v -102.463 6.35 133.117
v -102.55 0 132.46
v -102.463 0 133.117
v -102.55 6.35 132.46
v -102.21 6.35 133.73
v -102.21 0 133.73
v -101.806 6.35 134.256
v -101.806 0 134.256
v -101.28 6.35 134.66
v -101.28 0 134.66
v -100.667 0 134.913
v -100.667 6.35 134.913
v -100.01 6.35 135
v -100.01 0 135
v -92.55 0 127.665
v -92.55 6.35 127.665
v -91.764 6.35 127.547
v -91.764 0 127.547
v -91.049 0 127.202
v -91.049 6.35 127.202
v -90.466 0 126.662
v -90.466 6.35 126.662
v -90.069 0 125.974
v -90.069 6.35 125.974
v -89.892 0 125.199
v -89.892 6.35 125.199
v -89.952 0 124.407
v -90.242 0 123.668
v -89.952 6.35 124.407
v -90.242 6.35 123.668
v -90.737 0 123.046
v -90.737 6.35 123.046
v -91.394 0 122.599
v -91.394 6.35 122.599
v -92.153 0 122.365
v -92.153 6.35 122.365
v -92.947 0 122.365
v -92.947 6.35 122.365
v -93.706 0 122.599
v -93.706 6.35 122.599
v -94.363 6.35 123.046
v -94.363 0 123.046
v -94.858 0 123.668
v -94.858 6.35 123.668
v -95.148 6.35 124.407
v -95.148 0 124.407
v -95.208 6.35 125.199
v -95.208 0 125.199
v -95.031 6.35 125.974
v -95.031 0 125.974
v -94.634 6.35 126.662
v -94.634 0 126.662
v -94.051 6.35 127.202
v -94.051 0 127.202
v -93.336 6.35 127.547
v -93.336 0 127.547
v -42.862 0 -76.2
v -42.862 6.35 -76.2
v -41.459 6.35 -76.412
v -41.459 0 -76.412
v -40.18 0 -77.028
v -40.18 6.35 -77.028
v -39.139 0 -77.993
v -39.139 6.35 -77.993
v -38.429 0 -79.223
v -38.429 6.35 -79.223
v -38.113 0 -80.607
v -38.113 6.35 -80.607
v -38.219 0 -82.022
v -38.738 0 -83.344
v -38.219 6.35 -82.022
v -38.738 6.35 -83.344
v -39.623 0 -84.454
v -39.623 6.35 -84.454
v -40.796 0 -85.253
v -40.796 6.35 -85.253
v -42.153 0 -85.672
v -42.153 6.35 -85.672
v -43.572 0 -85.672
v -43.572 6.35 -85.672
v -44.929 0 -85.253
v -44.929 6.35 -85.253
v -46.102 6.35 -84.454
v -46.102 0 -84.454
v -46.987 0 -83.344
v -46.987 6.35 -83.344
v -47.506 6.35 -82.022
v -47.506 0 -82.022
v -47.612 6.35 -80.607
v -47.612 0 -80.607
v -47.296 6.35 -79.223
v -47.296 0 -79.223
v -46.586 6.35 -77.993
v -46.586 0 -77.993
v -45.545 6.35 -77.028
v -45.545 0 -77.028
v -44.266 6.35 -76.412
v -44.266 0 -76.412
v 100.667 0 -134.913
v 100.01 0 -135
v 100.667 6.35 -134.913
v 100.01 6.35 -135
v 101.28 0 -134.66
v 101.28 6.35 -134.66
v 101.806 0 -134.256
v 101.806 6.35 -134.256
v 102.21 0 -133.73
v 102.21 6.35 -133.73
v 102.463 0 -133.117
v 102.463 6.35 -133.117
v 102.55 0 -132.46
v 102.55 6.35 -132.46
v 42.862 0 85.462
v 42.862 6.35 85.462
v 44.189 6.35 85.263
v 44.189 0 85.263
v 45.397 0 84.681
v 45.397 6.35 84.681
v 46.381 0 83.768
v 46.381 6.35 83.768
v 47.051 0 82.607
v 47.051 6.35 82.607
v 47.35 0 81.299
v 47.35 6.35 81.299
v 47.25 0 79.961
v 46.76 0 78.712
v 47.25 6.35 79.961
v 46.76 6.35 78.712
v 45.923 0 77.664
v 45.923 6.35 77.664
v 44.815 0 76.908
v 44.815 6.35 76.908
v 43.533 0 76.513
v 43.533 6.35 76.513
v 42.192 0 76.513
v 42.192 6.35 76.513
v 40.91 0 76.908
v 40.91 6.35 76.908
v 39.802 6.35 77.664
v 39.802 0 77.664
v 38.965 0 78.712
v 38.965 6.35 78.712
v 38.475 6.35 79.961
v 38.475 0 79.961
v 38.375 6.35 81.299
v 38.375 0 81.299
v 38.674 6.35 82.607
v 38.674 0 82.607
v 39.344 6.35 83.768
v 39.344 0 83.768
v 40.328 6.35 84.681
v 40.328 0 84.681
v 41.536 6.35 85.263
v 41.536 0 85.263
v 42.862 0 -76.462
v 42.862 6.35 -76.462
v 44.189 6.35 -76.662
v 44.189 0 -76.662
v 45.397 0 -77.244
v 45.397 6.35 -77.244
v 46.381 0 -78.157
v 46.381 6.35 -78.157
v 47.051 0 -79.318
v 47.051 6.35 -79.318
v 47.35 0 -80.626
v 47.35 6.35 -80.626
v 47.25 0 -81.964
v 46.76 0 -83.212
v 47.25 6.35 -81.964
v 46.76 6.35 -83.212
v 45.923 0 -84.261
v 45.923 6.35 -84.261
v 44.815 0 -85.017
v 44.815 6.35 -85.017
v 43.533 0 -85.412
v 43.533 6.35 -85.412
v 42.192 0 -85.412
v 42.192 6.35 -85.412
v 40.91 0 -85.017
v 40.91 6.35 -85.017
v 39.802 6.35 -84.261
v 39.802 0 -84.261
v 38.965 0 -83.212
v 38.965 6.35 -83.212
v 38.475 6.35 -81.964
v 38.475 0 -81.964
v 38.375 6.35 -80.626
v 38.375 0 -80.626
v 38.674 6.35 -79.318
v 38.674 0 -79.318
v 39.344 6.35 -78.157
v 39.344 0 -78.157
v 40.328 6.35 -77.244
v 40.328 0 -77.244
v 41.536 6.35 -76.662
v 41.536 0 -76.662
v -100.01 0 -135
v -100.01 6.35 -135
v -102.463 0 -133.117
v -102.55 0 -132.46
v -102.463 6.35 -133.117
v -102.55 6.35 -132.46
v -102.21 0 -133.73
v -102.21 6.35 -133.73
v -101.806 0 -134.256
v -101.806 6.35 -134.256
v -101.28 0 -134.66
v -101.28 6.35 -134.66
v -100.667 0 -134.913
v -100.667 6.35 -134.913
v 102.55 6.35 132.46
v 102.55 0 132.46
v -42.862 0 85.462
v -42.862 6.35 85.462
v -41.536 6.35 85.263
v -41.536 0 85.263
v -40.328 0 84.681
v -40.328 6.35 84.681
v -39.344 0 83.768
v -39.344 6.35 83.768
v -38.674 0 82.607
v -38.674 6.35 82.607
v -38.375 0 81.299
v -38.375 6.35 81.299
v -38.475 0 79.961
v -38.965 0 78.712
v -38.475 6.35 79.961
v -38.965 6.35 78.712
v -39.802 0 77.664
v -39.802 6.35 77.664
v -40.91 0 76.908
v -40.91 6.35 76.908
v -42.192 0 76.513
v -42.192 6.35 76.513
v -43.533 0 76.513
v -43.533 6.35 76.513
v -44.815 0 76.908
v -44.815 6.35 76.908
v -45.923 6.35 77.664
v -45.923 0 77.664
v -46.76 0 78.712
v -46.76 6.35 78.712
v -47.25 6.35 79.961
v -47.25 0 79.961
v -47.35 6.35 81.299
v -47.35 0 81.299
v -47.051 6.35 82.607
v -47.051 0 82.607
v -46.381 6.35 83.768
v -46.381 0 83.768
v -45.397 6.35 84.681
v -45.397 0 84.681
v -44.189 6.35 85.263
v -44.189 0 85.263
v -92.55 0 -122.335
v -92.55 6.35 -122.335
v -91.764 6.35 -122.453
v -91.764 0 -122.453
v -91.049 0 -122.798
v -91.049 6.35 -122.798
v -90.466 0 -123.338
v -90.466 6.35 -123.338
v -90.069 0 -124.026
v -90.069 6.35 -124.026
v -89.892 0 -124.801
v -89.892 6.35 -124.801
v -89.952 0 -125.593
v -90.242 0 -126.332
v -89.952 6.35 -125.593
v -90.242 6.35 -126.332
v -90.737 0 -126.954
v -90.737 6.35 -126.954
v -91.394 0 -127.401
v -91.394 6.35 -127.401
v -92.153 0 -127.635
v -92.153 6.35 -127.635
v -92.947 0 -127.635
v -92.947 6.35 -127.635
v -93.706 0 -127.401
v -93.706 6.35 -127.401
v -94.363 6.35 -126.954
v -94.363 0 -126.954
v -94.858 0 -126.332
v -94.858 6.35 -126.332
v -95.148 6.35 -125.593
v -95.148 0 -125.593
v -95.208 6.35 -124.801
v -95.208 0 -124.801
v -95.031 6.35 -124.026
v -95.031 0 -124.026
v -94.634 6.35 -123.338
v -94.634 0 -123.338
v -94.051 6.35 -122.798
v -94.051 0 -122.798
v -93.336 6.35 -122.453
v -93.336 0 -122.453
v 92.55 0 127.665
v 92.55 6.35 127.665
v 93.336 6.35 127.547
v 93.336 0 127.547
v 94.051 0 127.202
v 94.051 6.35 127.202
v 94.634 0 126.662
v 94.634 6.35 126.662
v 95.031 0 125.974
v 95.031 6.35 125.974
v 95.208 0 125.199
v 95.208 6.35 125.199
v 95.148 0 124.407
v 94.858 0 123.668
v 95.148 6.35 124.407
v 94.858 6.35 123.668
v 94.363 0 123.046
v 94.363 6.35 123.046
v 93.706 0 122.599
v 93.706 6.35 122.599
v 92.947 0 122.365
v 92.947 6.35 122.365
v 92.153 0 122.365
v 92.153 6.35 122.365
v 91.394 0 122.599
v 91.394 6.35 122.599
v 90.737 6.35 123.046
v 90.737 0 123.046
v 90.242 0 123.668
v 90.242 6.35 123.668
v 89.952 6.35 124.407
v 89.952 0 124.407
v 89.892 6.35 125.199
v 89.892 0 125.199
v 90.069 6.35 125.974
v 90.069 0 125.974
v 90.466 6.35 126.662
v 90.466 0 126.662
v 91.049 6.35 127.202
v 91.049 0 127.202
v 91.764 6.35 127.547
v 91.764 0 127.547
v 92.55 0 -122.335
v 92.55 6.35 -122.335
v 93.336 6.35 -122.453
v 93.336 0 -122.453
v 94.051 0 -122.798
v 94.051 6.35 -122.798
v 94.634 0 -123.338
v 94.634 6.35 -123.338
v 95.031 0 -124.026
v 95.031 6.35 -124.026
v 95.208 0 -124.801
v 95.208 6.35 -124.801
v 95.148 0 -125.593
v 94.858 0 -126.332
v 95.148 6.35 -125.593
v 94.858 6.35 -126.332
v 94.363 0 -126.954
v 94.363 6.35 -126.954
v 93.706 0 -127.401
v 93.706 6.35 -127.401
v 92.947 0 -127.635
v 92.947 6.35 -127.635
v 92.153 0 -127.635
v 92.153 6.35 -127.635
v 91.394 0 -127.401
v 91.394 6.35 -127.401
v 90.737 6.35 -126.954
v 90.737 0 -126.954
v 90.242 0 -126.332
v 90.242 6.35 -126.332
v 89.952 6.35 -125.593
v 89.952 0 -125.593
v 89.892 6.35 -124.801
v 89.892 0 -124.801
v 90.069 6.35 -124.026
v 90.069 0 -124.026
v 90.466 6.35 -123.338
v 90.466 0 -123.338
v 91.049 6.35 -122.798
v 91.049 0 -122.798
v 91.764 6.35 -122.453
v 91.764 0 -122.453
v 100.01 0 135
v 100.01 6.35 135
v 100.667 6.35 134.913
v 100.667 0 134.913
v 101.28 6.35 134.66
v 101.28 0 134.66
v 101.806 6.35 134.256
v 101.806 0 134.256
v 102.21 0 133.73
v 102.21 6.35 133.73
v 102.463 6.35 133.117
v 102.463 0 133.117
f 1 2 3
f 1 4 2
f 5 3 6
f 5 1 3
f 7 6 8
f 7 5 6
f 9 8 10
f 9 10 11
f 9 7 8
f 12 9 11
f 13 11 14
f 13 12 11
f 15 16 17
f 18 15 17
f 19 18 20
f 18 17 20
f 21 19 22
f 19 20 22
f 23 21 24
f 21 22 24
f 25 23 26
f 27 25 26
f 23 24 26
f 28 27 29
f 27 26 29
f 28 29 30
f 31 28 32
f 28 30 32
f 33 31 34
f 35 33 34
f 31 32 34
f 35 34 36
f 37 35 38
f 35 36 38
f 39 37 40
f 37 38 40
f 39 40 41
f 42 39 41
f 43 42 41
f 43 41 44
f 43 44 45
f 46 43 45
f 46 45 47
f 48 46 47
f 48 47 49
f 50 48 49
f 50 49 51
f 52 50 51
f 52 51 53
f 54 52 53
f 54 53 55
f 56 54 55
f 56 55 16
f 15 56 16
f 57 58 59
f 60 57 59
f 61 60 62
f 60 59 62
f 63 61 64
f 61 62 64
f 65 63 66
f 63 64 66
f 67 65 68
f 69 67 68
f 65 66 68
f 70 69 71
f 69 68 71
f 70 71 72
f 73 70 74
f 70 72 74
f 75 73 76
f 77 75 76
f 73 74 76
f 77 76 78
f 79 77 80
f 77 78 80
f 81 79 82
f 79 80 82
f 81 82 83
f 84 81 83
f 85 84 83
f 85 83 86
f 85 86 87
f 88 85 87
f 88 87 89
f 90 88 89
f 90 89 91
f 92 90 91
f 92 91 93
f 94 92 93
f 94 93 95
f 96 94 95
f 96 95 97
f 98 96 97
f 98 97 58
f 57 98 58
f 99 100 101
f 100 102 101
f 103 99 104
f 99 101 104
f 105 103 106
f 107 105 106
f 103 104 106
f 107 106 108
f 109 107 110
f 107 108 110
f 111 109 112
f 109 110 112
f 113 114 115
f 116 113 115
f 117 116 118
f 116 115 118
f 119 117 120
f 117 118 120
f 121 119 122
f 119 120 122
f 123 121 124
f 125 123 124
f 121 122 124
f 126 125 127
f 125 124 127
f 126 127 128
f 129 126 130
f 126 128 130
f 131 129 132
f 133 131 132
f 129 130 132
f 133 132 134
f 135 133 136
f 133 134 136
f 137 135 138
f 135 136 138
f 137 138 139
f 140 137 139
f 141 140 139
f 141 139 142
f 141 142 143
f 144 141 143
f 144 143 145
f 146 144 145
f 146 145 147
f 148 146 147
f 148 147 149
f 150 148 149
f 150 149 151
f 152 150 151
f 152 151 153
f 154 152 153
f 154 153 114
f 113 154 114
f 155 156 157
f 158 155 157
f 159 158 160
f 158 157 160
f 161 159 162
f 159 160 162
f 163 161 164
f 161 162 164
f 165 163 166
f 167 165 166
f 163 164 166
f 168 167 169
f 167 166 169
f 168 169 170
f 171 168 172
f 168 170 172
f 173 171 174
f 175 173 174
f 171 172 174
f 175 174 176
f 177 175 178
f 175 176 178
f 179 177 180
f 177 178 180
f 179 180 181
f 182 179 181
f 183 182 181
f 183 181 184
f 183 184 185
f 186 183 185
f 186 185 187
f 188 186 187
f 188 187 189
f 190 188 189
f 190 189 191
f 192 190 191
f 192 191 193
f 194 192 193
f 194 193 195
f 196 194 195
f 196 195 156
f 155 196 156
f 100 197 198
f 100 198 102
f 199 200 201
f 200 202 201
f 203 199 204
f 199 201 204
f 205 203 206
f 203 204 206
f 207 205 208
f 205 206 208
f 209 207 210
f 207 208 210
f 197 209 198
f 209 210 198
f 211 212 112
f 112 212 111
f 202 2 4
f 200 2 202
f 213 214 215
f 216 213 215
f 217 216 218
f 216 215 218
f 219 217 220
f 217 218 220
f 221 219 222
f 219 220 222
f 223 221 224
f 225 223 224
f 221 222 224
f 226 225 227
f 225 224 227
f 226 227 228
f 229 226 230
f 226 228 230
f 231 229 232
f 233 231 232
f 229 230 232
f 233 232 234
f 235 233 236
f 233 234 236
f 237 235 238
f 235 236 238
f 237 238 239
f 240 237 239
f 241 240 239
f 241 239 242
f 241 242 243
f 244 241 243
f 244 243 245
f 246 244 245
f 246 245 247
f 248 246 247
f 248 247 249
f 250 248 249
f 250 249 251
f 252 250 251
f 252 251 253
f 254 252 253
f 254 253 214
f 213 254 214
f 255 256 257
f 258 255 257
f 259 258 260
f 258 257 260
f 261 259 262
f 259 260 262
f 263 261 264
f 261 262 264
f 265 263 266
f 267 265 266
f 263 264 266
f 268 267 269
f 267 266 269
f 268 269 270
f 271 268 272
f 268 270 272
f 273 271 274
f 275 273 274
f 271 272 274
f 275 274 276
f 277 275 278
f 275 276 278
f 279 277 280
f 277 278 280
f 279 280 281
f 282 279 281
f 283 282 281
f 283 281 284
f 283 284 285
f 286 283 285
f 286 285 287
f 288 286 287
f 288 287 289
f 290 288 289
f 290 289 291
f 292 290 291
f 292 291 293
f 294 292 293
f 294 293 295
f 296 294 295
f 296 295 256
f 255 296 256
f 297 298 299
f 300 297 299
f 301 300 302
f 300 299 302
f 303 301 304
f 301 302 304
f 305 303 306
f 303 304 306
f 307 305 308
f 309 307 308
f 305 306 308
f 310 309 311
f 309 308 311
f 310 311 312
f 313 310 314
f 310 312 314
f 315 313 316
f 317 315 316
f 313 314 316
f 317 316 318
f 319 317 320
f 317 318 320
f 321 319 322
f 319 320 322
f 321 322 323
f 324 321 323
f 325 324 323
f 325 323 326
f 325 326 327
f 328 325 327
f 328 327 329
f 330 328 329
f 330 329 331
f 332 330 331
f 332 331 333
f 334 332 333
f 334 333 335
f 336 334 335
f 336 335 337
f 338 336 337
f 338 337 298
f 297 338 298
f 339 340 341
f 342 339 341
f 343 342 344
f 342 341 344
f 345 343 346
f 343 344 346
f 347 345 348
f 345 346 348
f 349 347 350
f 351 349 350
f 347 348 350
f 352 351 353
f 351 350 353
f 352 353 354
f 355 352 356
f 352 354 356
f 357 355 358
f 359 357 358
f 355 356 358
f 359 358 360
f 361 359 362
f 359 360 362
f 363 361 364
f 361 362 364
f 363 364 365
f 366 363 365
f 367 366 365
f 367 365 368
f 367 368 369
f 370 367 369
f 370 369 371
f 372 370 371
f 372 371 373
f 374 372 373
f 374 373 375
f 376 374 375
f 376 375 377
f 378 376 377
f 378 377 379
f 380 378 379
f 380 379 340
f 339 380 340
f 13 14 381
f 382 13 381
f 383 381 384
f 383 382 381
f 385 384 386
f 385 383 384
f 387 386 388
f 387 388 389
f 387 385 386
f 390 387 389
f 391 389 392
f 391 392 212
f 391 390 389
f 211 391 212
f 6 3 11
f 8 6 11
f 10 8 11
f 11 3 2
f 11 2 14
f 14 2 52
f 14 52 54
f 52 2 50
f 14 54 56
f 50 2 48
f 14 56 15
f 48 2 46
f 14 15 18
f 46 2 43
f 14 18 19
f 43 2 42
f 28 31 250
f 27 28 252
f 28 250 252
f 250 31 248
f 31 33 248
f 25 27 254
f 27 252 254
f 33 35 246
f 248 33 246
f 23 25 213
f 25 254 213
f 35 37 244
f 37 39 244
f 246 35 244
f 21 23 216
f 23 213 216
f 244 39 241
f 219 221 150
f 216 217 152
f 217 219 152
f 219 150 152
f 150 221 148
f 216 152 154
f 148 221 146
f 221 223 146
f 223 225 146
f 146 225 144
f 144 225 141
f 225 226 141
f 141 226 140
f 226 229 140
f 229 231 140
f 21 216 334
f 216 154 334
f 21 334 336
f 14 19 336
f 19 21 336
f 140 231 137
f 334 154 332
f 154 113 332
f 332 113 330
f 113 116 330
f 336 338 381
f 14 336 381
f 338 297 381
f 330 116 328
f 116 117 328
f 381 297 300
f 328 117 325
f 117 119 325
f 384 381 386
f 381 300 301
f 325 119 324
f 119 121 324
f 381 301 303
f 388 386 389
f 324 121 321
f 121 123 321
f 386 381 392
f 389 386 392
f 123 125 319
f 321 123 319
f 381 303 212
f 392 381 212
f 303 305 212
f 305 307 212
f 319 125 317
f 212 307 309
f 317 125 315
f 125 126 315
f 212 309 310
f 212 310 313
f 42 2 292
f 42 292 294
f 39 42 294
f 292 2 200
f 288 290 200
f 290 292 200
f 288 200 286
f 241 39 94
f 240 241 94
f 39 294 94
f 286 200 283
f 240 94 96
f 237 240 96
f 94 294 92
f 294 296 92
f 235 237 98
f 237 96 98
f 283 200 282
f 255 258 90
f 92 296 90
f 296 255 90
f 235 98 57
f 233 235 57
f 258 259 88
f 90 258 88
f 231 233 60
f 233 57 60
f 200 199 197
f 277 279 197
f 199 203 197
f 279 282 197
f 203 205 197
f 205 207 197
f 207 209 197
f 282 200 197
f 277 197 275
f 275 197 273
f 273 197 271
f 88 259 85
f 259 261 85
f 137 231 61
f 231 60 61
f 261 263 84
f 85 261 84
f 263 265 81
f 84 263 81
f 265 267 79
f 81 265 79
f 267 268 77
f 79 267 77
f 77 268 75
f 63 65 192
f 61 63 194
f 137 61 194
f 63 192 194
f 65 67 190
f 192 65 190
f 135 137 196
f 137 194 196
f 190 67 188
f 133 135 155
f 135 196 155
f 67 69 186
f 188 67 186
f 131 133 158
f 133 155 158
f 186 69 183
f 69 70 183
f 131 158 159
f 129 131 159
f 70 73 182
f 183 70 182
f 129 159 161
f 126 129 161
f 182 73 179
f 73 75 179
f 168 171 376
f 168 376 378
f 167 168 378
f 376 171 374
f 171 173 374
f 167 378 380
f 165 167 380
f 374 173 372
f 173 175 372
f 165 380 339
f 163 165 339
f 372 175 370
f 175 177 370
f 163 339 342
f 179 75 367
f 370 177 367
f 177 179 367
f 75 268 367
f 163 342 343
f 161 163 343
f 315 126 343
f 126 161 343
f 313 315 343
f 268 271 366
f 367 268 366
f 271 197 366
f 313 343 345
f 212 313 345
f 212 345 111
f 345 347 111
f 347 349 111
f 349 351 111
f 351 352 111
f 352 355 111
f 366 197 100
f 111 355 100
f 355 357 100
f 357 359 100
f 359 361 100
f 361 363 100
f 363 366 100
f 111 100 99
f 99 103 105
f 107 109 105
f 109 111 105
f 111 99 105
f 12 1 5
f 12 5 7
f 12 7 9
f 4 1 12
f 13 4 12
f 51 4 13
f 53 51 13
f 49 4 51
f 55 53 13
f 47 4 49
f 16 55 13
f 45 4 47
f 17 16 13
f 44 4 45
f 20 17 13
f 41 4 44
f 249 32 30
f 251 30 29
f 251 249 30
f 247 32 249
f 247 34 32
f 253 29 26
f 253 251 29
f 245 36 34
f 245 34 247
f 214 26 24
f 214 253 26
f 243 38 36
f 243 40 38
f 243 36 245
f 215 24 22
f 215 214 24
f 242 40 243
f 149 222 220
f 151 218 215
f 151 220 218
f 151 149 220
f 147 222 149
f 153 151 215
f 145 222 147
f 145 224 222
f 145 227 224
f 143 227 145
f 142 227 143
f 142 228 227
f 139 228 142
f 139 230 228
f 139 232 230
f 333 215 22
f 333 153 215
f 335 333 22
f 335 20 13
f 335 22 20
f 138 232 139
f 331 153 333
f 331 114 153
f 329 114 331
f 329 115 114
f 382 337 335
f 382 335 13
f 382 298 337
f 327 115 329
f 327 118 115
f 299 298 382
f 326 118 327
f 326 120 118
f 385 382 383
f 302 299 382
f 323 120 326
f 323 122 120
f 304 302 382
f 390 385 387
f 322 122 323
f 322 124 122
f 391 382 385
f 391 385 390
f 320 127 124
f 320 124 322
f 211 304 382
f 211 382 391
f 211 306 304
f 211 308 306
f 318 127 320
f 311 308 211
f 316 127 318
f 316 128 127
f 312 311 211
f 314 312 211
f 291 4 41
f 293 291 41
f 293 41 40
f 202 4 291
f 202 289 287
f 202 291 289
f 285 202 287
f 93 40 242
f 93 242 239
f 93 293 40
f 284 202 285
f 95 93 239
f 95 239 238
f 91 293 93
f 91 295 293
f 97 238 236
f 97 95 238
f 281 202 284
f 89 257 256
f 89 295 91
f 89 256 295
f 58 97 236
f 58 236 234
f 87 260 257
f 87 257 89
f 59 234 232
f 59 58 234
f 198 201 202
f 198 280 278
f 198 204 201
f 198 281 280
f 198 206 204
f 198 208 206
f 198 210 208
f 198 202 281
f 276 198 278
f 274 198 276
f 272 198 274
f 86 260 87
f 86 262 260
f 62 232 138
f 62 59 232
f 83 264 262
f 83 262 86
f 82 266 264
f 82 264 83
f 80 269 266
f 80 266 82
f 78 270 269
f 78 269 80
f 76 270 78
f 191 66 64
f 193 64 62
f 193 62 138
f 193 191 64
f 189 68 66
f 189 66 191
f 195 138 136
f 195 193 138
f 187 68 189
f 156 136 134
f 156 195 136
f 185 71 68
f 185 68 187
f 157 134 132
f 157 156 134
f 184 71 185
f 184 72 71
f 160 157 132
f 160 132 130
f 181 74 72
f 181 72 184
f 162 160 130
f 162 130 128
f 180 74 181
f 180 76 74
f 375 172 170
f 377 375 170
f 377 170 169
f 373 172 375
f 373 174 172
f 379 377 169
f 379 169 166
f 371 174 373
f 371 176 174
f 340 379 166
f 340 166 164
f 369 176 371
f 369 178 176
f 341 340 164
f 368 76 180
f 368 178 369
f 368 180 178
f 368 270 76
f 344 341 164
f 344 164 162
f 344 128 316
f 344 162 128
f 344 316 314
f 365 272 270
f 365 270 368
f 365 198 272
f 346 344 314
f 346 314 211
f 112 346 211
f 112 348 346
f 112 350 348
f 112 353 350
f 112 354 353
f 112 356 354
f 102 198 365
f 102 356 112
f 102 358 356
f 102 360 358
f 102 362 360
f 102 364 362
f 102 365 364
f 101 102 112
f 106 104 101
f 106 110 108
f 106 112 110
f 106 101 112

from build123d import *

# Parameters (mm, degrees)
SKETCH1_W           = 205.1
SKETCH1_H           = 270
BOSS_EXTRUDE1_DEPTH = 6.35
CUT_EXTRUDE2_REACH  = 171.652
SKETCH3_R           = 2.665
CUT_EXTRUDE3_REACH  = 171.652
SKETCH2_R           = 4.7625
SKETCH2_R_2         = 4.5
FILLET1_R           = 2.54


with BuildPart() as part:
    # Sketch1 → Boss-Extrude1 (new body)
    with BuildSketch(Plane(origin=(0, 0, 0), x_dir=(1, 0, 0), z_dir=(0, 1, 0))):
        Rectangle(SKETCH1_W, SKETCH1_H)
    extrude(amount=BOSS_EXTRUDE1_DEPTH)

    # Sketch3 → Cut-Extrude2 (cut, up to next)
    with BuildSketch(Plane(origin=(0, 6.35, 0), x_dir=(-1, 0, 0), z_dir=(0, 1, 0)), mode=Mode.PRIVATE) as cut_extrude2_sk1:
        with Locations(Location((92.55, 125, 0), (0, 0, 90))):
            Circle(SKETCH3_R)
    cut_extrude2_tool1 = extrude(cut_extrude2_sk1.sketch, amount=-CUT_EXTRUDE2_REACH, mode=Mode.PRIVATE) & part.part
    # Sketch3 → Cut-Extrude2 (cut, up to next)
    with BuildSketch(Plane(origin=(0, 6.35, 0), x_dir=(-1, 0, 0), z_dir=(0, 1, 0)), mode=Mode.PRIVATE) as cut_extrude2_sk2:
        with Locations(Location((-92.55, 125, 0), (0, 0, 90))):
            Circle(SKETCH3_R)
    cut_extrude2_tool2 = extrude(cut_extrude2_sk2.sketch, amount=-CUT_EXTRUDE2_REACH, mode=Mode.PRIVATE) & part.part
    # Sketch3 → Cut-Extrude2 (cut, up to next)
    with BuildSketch(Plane(origin=(0, 6.35, 0), x_dir=(-1, 0, 0), z_dir=(0, 1, 0)), mode=Mode.PRIVATE) as cut_extrude2_sk3:
        with Locations(Location((-92.55, -125, 0), (0, 0, 90))):
            Circle(SKETCH3_R)
    cut_extrude2_tool3 = extrude(cut_extrude2_sk3.sketch, amount=-CUT_EXTRUDE2_REACH, mode=Mode.PRIVATE) & part.part
    # Sketch3 → Cut-Extrude2 (cut, up to next)
    with BuildSketch(Plane(origin=(0, 6.35, 0), x_dir=(-1, 0, 0), z_dir=(0, 1, 0)), mode=Mode.PRIVATE) as cut_extrude2_sk4:
        with Locations(Location((92.55, -125, 0), (0, 0, 90))):
            Circle(SKETCH3_R)
    cut_extrude2_tool4 = extrude(cut_extrude2_sk4.sketch, amount=-CUT_EXTRUDE2_REACH, mode=Mode.PRIVATE) & part.part
    add(cut_extrude2_tool1.solids().sort_by_distance((-92.55, 6.35, 125))[0], mode=Mode.SUBTRACT)
    add(cut_extrude2_tool2.solids().sort_by_distance((92.55, 6.35, 125))[0], mode=Mode.SUBTRACT)
    add(cut_extrude2_tool3.solids().sort_by_distance((92.55, 6.35, -125))[0], mode=Mode.SUBTRACT)
    add(cut_extrude2_tool4.solids().sort_by_distance((-92.55, 6.35, -125))[0], mode=Mode.SUBTRACT)

    # Sketch2 → Cut-Extrude3 (cut, up to next)
    with BuildSketch(Plane(origin=(0, 6.35, 0), x_dir=(1, 0, 0), z_dir=(0, 1, 0)), mode=Mode.PRIVATE) as cut_extrude3_sk1:
        with Locations(Location((-42.8625, 80.9625, 0), (0, 0, 270))):
            Circle(SKETCH2_R)
    cut_extrude3_tool1 = extrude(cut_extrude3_sk1.sketch, amount=-CUT_EXTRUDE3_REACH, mode=Mode.PRIVATE) & part.part
    # Sketch2 → Cut-Extrude3 (cut, up to next)
    with BuildSketch(Plane(origin=(0, 6.35, 0), x_dir=(1, 0, 0), z_dir=(0, 1, 0)), mode=Mode.PRIVATE) as cut_extrude3_sk2:
        with Locations(Location((-42.8625, -80.9625, 0), (0, 0, 270))):
            Circle(SKETCH2_R_2)
    cut_extrude3_tool2 = extrude(cut_extrude3_sk2.sketch, amount=-CUT_EXTRUDE3_REACH, mode=Mode.PRIVATE) & part.part
    # Sketch2 → Cut-Extrude3 (cut, up to next)
    with BuildSketch(Plane(origin=(0, 6.35, 0), x_dir=(1, 0, 0), z_dir=(0, 1, 0)), mode=Mode.PRIVATE) as cut_extrude3_sk3:
        with Locations(Location((42.8625, -80.9625, 0), (0, 0, 270))):
            Circle(SKETCH2_R_2)
    cut_extrude3_tool3 = extrude(cut_extrude3_sk3.sketch, amount=-CUT_EXTRUDE3_REACH, mode=Mode.PRIVATE) & part.part
    # Sketch2 → Cut-Extrude3 (cut, up to next)
    with BuildSketch(Plane(origin=(0, 6.35, 0), x_dir=(1, 0, 0), z_dir=(0, 1, 0)), mode=Mode.PRIVATE) as cut_extrude3_sk4:
        with Locations(Location((42.8625, 80.9625, 0), (0, 0, 270))):
            Circle(SKETCH2_R_2)
    cut_extrude3_tool4 = extrude(cut_extrude3_sk4.sketch, amount=-CUT_EXTRUDE3_REACH, mode=Mode.PRIVATE) & part.part
    add(cut_extrude3_tool1.solids().sort_by_distance((-42.8625, 6.35, -80.9625))[0], mode=Mode.SUBTRACT)
    add(cut_extrude3_tool2.solids().sort_by_distance((-42.8625, 6.35, 80.9625))[0], mode=Mode.SUBTRACT)
    add(cut_extrude3_tool3.solids().sort_by_distance((42.8625, 6.35, 80.9625))[0], mode=Mode.SUBTRACT)
    add(cut_extrude3_tool4.solids().sort_by_distance((42.8625, 6.35, -80.9625))[0], mode=Mode.SUBTRACT)

    # Fillet1
    fillet1_edges = [part.edges().sort_by_distance(p)[0] for p in [
        (-102.55, 3.175, -135),
        (102.55, 3.175, -135),
        (102.55, 3.175, 135),
        (-102.55, 3.175, 135),
    ]]
    fillet(fillet1_edges, radius=FILLET1_R)


solid = part.part
